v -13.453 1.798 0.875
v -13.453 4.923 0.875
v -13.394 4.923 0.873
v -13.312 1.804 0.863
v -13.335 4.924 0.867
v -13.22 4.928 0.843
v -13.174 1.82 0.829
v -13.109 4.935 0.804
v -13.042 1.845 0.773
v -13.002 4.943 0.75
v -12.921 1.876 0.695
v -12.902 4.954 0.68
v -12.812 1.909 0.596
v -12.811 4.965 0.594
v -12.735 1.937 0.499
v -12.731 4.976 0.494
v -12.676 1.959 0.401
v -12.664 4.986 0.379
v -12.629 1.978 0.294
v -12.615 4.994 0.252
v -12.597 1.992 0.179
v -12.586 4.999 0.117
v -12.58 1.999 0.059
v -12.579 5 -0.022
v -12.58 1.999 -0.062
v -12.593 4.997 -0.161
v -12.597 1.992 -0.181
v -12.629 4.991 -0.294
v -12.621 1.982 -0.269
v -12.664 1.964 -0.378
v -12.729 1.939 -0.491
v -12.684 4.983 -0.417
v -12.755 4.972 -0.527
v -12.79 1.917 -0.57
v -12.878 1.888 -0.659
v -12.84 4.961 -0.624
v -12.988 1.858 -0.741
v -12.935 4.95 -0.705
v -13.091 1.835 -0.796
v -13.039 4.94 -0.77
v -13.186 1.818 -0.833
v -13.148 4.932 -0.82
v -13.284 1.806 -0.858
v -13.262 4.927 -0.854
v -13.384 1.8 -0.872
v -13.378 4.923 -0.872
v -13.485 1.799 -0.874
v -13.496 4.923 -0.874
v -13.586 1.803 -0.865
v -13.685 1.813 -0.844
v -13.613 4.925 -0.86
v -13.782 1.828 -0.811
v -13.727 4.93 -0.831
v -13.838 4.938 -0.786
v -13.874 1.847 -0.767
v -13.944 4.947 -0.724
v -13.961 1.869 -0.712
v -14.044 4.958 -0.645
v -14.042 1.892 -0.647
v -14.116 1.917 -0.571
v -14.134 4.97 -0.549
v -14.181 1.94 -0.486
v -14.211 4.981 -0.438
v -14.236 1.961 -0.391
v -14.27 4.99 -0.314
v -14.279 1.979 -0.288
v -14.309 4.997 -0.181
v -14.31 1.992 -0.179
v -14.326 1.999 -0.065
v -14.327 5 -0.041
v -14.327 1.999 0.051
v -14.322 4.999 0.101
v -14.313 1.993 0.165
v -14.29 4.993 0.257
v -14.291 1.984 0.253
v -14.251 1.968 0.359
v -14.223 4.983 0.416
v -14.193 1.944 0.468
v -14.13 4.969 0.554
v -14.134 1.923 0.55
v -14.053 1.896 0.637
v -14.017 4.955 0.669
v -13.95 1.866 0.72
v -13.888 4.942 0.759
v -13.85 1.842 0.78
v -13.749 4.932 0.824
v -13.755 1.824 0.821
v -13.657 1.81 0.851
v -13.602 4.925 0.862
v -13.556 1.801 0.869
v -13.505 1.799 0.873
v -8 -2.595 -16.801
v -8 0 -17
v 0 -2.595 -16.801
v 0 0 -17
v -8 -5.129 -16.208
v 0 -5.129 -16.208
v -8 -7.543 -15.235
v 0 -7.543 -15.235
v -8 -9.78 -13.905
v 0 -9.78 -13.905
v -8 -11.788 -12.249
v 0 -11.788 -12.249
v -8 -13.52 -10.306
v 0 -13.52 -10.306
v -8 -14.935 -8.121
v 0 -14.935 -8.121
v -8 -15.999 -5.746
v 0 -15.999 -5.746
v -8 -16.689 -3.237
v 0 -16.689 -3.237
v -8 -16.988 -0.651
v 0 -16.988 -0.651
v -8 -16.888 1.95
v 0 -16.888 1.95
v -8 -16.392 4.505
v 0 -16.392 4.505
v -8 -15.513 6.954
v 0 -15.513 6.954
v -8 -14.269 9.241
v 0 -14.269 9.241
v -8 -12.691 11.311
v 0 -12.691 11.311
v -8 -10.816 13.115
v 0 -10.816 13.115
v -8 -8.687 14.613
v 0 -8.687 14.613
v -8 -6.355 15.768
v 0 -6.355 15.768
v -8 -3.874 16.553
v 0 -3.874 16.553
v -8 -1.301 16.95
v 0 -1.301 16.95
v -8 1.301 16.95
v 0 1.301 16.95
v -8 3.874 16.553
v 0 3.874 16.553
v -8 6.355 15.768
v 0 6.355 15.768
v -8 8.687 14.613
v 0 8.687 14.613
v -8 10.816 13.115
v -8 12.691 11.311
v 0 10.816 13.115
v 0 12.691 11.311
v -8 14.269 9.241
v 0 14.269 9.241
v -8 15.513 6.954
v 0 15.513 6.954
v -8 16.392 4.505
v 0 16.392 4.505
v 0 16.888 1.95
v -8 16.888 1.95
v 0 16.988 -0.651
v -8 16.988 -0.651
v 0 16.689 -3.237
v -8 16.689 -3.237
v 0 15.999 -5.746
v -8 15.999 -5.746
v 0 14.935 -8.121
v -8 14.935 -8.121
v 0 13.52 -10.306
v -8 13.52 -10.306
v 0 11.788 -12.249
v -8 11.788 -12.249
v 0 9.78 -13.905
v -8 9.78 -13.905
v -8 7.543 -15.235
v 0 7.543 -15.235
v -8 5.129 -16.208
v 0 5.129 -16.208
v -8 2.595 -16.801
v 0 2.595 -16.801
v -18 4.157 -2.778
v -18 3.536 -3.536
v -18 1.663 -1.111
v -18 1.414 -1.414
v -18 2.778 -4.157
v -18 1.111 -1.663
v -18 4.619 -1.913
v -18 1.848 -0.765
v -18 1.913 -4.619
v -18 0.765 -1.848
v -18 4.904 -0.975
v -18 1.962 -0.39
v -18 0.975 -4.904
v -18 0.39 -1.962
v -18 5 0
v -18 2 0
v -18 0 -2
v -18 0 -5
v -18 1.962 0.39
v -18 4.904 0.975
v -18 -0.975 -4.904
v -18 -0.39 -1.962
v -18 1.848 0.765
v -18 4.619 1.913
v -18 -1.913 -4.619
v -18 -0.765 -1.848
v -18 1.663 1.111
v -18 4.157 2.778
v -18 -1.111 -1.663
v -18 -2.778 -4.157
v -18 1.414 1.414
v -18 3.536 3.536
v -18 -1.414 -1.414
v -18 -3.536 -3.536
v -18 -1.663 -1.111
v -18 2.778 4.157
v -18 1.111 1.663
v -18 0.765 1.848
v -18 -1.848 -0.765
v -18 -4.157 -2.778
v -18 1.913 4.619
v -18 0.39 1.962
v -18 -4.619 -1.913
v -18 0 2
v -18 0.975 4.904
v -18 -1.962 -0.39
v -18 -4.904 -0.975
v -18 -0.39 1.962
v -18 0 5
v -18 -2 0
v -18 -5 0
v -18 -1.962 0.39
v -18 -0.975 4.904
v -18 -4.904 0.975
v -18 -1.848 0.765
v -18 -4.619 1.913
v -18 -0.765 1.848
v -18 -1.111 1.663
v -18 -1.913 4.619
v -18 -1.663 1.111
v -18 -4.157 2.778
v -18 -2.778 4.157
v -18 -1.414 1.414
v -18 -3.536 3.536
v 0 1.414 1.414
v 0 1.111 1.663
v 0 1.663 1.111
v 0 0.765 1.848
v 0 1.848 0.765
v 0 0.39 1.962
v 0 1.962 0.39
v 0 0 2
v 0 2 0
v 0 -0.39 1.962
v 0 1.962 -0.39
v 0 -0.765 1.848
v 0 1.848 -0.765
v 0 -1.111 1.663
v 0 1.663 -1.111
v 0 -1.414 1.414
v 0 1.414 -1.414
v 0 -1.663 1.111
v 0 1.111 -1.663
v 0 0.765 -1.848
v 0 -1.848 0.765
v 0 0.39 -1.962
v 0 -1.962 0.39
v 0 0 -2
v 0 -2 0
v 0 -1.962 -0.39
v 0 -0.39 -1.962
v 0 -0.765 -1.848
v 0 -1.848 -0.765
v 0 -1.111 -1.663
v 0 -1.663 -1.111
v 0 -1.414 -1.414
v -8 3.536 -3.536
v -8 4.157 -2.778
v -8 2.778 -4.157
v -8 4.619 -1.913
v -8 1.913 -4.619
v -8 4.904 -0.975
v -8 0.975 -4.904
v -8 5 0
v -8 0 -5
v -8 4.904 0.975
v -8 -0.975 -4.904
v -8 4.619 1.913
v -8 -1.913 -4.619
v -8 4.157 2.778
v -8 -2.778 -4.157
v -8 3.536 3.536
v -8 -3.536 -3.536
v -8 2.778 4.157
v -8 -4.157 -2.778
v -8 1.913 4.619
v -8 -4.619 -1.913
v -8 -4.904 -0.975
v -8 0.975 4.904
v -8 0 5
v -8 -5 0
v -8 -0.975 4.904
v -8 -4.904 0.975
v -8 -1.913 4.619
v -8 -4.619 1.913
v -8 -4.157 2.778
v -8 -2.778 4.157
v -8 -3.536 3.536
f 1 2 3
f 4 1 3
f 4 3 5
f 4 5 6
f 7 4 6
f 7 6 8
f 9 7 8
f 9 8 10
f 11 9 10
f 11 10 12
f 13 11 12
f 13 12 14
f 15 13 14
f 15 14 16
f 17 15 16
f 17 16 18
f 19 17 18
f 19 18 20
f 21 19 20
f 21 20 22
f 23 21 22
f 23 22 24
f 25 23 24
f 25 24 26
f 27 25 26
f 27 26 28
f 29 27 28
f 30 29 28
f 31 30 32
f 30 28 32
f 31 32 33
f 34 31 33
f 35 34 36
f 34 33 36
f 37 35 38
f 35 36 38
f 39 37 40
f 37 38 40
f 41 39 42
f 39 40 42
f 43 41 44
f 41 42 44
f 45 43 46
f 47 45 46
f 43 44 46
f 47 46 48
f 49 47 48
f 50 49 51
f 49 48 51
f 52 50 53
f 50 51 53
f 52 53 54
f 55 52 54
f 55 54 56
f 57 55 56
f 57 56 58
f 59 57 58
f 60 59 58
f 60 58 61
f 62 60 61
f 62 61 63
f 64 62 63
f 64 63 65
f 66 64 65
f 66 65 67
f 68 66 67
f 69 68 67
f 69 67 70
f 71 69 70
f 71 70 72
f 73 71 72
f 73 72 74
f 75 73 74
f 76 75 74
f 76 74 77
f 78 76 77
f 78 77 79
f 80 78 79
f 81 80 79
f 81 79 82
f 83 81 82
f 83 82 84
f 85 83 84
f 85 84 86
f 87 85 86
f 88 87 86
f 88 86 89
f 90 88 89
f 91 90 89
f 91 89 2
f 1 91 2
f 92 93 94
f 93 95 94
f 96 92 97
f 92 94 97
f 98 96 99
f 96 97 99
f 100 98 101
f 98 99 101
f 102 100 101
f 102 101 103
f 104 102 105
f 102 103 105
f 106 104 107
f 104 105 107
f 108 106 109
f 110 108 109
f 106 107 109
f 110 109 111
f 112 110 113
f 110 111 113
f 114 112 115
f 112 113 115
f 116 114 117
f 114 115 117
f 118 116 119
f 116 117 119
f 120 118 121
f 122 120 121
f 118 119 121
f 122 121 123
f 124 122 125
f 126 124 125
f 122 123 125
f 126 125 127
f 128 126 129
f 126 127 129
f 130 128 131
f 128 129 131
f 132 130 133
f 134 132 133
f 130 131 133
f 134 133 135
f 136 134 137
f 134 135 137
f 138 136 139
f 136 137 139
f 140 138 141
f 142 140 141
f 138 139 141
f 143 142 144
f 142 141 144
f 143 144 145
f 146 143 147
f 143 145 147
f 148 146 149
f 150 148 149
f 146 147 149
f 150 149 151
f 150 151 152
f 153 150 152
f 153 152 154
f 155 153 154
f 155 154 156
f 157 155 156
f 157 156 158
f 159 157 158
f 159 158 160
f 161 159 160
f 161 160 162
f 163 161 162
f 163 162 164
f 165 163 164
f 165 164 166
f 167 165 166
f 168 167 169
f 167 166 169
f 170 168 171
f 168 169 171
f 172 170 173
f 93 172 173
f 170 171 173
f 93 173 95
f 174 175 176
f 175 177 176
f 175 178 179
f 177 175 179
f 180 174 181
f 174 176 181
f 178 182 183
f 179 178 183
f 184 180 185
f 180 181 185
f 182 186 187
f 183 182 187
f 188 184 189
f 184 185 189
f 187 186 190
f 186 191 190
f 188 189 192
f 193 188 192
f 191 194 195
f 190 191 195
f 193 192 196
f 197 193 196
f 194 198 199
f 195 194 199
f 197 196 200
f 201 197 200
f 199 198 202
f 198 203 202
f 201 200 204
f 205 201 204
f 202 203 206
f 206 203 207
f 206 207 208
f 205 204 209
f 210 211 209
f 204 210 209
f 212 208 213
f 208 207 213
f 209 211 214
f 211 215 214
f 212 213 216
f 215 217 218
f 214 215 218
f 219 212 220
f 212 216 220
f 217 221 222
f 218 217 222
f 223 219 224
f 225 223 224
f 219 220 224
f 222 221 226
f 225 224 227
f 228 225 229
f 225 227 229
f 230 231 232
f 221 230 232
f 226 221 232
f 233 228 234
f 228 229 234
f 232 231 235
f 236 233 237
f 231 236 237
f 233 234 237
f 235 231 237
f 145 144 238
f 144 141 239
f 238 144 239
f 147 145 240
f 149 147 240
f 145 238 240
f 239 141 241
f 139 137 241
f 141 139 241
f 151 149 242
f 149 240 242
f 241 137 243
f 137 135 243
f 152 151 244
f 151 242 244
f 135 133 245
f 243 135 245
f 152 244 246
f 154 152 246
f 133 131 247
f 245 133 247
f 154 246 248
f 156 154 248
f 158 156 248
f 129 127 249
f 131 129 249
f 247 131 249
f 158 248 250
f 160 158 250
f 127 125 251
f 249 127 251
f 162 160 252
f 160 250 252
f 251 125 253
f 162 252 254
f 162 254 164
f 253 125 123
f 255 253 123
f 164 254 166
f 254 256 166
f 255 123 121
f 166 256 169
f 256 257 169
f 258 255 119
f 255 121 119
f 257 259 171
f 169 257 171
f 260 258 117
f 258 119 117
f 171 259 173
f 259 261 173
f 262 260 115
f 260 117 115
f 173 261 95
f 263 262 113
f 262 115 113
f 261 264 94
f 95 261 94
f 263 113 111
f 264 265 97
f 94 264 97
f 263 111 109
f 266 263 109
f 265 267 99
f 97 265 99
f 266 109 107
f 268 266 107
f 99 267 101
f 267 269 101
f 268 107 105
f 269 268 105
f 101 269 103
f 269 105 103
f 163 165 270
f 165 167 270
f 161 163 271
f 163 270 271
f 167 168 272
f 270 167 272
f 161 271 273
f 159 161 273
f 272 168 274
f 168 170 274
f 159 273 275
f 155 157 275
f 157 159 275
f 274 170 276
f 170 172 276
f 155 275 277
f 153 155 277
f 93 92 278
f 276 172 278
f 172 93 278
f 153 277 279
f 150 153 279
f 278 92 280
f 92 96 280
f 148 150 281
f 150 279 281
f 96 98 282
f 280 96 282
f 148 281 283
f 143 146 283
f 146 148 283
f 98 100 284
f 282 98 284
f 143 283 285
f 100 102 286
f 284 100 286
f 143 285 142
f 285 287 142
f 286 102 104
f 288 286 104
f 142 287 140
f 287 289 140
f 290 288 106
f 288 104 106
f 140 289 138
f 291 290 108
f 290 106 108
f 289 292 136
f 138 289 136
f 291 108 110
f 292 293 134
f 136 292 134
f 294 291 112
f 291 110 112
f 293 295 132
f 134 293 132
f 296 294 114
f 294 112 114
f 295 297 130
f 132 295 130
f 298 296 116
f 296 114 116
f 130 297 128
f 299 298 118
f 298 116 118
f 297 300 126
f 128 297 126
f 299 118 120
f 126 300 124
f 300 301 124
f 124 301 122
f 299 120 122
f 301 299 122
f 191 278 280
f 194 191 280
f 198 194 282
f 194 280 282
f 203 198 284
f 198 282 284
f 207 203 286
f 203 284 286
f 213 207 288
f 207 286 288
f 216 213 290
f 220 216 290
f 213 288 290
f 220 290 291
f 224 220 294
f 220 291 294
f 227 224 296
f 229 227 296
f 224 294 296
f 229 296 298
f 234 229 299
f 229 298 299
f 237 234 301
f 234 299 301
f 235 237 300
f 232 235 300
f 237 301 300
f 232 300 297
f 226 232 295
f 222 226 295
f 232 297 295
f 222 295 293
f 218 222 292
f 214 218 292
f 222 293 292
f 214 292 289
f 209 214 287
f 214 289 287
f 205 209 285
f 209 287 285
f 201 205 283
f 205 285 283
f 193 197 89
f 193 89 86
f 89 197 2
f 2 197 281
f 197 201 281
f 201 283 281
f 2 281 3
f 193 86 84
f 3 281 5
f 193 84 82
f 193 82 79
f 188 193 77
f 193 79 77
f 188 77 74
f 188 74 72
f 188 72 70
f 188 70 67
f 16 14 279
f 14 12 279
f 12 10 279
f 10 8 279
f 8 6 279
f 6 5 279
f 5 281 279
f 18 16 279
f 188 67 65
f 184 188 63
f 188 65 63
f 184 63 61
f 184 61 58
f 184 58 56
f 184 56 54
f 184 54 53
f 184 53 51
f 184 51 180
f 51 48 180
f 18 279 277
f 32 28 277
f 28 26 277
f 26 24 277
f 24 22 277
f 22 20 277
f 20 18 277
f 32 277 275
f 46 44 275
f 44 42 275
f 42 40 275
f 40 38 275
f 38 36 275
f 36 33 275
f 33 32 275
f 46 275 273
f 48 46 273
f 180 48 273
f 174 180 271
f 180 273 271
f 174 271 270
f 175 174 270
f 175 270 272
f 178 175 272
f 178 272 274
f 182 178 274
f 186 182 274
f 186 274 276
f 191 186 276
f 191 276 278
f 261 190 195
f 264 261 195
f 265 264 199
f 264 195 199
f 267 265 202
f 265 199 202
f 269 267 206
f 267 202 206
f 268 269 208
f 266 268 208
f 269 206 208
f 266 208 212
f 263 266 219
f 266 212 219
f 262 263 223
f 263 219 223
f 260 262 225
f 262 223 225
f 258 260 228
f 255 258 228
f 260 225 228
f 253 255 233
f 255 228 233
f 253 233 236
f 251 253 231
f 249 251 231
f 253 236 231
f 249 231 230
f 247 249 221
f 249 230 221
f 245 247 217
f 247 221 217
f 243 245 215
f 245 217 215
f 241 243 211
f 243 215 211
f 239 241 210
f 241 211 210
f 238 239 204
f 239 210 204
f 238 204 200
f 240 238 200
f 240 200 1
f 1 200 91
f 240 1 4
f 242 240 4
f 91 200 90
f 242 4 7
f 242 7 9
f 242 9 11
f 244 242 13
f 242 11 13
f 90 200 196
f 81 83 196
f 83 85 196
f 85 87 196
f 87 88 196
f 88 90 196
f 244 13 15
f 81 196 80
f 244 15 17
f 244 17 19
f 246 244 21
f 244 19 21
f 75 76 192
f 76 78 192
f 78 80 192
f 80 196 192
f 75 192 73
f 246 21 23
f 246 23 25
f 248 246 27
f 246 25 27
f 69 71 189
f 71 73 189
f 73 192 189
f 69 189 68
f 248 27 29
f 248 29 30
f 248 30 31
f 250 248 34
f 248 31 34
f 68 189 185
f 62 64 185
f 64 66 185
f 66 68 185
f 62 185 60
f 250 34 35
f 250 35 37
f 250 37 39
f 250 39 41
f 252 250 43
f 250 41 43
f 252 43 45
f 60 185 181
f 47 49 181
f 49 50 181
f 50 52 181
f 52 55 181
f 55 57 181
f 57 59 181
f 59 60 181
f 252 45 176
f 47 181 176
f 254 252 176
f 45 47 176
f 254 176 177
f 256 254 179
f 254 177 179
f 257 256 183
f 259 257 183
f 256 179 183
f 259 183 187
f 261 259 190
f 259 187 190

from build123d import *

# Parameters (mm, degrees)
BROCA_DE_ROSQUEAR_PARA_TARRAXA_DE_M2_2X0_REACH = 32.887
BROCA_DE_ROSQUEAR_PARA_TARRAXA_DE_M2_2_R       = 0.875


with BuildPart() as part:
    # Esboço3 → Revolução1 (revolve)
    with BuildSketch(Plane.XY, mode=Mode.PRIVATE) as revolu_o1_sk:
        Polygon((0, 17), (0, 2), (-18, 2), (-18, 5), (-8, 5), (-8, 17), align=None)
    revolve(revolu_o1_sk.sketch.rotate(Axis((0, 0, 0), (-1, 0, 0)), 90), axis=Axis((0, 0, 0), (-1, 0, 0)))

    # Broca de rosquear para tarraxa de M2 2 (on position points) → Broca de rosquear para tarraxa de M2.2x0.451 (cut, up to next)
    with BuildSketch(Plane(origin=(-13.453220178, 5, 0), x_dir=(0, 0, 1), z_dir=(0, 1, 0)), mode=Mode.PRIVATE) as broca_de_rosquear_para_tarraxa_de_m2_2x0_sk1:
        Circle(BROCA_DE_ROSQUEAR_PARA_TARRAXA_DE_M2_2_R)
    broca_de_rosquear_para_tarraxa_de_m2_2x0_tool1 = extrude(broca_de_rosquear_para_tarraxa_de_m2_2x0_sk1.sketch, amount=-BROCA_DE_ROSQUEAR_PARA_TARRAXA_DE_M2_2X0_REACH, mode=Mode.PRIVATE) & part.part
    add(broca_de_rosquear_para_tarraxa_de_m2_2x0_tool1.solids().sort_by_distance((-13.45322, 5, 0))[0], mode=Mode.SUBTRACT)


solid = part.part
